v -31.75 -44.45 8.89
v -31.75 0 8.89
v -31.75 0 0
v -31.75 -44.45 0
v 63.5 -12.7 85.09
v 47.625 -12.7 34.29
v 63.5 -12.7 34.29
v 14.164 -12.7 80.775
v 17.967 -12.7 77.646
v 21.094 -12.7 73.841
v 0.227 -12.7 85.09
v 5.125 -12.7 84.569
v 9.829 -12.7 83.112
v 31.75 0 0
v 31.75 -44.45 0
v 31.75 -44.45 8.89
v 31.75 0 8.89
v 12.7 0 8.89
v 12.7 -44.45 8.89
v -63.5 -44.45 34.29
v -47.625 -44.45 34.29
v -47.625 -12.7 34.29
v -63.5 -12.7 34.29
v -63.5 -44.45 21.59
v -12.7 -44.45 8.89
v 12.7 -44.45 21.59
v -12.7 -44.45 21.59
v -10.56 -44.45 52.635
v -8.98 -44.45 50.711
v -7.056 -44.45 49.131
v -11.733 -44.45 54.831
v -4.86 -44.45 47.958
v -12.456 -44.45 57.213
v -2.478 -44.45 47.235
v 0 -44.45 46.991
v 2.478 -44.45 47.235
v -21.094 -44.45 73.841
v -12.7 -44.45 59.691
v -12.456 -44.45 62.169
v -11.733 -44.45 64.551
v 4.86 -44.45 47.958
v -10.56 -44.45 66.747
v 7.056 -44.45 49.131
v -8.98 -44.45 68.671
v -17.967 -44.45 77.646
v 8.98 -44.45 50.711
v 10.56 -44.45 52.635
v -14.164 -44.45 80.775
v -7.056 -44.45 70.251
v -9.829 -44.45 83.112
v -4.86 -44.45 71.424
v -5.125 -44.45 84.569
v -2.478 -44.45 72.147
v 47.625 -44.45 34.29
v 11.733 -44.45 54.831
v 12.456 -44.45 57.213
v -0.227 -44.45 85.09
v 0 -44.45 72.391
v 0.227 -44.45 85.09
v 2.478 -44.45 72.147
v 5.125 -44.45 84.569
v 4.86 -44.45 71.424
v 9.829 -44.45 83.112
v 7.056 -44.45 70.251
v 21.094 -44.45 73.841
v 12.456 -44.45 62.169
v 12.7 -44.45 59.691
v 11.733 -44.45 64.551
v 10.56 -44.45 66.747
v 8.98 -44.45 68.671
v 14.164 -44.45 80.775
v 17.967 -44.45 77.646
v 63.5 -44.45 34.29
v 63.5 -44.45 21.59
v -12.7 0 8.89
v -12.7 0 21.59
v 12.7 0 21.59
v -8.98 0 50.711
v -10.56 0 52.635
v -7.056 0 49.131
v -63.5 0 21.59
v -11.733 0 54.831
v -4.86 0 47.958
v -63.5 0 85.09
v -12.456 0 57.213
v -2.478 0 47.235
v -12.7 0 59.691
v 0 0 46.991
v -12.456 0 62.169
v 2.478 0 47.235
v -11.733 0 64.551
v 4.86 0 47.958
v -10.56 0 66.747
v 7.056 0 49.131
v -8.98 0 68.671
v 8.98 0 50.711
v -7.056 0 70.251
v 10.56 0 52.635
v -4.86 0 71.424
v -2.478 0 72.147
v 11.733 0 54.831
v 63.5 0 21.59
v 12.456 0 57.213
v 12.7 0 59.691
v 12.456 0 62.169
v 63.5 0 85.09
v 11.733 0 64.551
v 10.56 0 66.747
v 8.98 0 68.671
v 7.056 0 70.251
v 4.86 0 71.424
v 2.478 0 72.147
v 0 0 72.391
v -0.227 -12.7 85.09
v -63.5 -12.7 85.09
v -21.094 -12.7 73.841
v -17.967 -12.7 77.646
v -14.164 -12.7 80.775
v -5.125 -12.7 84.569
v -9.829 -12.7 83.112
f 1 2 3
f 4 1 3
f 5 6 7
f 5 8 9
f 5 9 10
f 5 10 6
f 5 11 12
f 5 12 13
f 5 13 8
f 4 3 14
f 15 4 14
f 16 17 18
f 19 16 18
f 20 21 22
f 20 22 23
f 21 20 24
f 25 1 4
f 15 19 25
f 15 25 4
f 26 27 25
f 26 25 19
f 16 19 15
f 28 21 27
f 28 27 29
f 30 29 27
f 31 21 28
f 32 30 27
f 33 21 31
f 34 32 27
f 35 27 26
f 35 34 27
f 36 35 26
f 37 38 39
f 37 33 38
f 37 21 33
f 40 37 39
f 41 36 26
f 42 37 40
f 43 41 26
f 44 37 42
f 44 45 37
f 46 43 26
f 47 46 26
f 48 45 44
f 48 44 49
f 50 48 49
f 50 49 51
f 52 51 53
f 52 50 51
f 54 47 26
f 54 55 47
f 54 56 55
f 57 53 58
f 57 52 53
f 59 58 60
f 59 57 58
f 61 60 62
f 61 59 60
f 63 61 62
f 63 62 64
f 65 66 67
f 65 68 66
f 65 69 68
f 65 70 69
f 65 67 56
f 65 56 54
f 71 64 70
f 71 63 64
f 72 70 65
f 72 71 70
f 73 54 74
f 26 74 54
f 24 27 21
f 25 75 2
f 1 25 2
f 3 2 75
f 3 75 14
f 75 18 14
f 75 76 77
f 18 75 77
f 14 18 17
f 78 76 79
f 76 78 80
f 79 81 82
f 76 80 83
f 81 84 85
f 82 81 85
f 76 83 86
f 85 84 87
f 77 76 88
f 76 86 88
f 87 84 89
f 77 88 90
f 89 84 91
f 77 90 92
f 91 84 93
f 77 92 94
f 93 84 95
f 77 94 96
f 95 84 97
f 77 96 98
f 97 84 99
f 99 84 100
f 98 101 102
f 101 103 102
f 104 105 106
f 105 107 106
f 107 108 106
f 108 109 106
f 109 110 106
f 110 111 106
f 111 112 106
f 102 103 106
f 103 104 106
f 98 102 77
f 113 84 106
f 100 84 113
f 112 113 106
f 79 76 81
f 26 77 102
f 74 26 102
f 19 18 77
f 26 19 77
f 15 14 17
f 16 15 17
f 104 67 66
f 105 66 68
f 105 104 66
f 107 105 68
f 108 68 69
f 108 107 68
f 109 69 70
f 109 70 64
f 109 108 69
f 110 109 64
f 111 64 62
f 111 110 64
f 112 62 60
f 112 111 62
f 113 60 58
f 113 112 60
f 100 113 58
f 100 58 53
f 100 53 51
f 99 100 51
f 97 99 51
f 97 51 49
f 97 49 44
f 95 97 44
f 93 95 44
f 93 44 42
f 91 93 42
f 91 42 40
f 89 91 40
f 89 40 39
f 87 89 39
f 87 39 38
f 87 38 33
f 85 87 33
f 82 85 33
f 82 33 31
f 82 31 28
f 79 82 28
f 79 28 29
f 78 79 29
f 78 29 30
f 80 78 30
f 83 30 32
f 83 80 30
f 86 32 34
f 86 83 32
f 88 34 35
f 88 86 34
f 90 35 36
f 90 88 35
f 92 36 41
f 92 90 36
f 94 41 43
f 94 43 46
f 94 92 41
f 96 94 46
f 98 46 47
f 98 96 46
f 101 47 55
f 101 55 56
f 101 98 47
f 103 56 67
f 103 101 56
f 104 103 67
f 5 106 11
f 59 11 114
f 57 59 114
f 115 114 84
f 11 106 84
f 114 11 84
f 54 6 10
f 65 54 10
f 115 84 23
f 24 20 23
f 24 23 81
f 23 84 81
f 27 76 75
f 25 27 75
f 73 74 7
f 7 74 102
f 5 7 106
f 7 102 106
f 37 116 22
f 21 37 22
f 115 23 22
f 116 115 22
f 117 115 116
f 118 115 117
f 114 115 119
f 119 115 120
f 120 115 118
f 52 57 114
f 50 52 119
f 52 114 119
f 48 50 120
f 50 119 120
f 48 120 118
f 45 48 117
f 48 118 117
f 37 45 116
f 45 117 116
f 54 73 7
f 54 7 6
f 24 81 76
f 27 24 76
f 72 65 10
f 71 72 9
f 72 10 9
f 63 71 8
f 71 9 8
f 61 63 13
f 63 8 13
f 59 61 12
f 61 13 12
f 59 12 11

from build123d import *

# Parameters (mm, degrees)
F0_R     = 12.7
F1_DEPTH = 44.45
F2_DEPTH = 12.7


with BuildPart() as f1:
    # F0 (on Front) → F1 (new body)
    with BuildSketch(Plane.XZ):
        with BuildLine():
            Line((-31.75, 0), (0, 0))
            Line((0, 0), (31.75, 0))
            Line((31.75, 0), (31.75, 8.89))
            Line((31.75, 8.89), (12.7, 8.89))
            Line((12.7, 8.89), (12.7, 21.59))
            Line((12.7, 21.59), (63.5, 21.59))
            Line((63.5, 21.59), (63.5, 34.29))
            Line((63.5, 34.29), (47.625, 34.29))
            Line((47.625, 34.29), (21.0935941582, 73.8409400841))
            ThreePointArc((21.0935941582, 73.8409400841), (12.0532981257, 82.0489700372), (0.2274431955, 85.09))
            Line((0.2274431955, 85.09), (-0.2274431955, 85.09))
            ThreePointArc((-0.2274431955, 85.09), (-12.0532981257, 82.0489700372), (-21.0935941582, 73.8409400841))
            Line((-21.0935941582, 73.8409400841), (-47.625, 34.29))
            Line((-47.625, 34.29), (-63.5, 34.29))
            Line((-63.5, 34.29), (-63.5, 21.59))
            Line((-63.5, 21.59), (-12.7, 21.59))
            Line((-12.7, 21.59), (-12.7, 8.89))
            Line((-12.7, 8.89), (-31.75, 8.89))
            Line((-31.75, 8.89), (-31.75, 0))
        make_face()
        with Locations((0, 59.6910183355)):
            Circle(F0_R, mode=Mode.SUBTRACT)
    extrude(amount=F1_DEPTH)

    # F0 (on Front) → F2 (join)
    with BuildSketch(Plane.XZ):
        with BuildLine():
            Line((-31.75, 0), (0, 0))
            Line((0, 0), (31.75, 0))
            Line((31.75, 0), (31.75, 8.89))
            Line((31.75, 8.89), (12.7, 8.89))
            Line((12.7, 8.89), (12.7, 21.59))
            Line((12.7, 21.59), (63.5, 21.59))
            Line((63.5, 21.59), (63.5, 34.29))
            Line((63.5, 34.29), (47.625, 34.29))
            Line((47.625, 34.29), (21.0935941582, 73.8409400841))
            ThreePointArc((21.0935941582, 73.8409400841), (12.0532981257, 82.0489700372), (0.2274431955, 85.09))
            Line((0.2274431955, 85.09), (-0.2274431955, 85.09))
            ThreePointArc((-0.2274431955, 85.09), (-12.0532981257, 82.0489700372), (-21.0935941582, 73.8409400841))
            Line((-21.0935941582, 73.8409400841), (-47.625, 34.29))
            Line((-47.625, 34.29), (-63.5, 34.29))
            Line((-63.5, 34.29), (-63.5, 21.59))
            Line((-63.5, 21.59), (-12.7, 21.59))
            Line((-12.7, 21.59), (-12.7, 8.89))
            Line((-12.7, 8.89), (-31.75, 8.89))
            Line((-31.75, 8.89), (-31.75, 0))
        make_face()
        with Locations((0, 59.6910183355)):
            Circle(F0_R, mode=Mode.SUBTRACT)
        with BuildLine():
            Line((47.625, 34.29), (63.5, 34.29))
            Line((63.5, 34.29), (63.5, 85.09))
            Line((63.5, 85.09), (0.2274431955, 85.09))
            ThreePointArc((0.2274431955, 85.09), (12.0532981257, 82.0489700372), (21.0935941582, 73.8409400841))
            Line((21.0935941582, 73.8409400841), (47.625, 34.29))
        make_face()
        with BuildLine():
            Line((-63.5, 85.09), (-63.5, 34.29))
            Line((-63.5, 34.29), (-47.625, 34.29))
            Line((-47.625, 34.29), (-21.0935941582, 73.8409400841))
            ThreePointArc((-21.0935941582, 73.8409400841), (-12.0532981257, 82.0489700372), (-0.2274431955, 85.09))
            Line((-0.2274431955, 85.09), (-63.5, 85.09))
        make_face()
    extrude(amount=F2_DEPTH)


solid = f1.part
